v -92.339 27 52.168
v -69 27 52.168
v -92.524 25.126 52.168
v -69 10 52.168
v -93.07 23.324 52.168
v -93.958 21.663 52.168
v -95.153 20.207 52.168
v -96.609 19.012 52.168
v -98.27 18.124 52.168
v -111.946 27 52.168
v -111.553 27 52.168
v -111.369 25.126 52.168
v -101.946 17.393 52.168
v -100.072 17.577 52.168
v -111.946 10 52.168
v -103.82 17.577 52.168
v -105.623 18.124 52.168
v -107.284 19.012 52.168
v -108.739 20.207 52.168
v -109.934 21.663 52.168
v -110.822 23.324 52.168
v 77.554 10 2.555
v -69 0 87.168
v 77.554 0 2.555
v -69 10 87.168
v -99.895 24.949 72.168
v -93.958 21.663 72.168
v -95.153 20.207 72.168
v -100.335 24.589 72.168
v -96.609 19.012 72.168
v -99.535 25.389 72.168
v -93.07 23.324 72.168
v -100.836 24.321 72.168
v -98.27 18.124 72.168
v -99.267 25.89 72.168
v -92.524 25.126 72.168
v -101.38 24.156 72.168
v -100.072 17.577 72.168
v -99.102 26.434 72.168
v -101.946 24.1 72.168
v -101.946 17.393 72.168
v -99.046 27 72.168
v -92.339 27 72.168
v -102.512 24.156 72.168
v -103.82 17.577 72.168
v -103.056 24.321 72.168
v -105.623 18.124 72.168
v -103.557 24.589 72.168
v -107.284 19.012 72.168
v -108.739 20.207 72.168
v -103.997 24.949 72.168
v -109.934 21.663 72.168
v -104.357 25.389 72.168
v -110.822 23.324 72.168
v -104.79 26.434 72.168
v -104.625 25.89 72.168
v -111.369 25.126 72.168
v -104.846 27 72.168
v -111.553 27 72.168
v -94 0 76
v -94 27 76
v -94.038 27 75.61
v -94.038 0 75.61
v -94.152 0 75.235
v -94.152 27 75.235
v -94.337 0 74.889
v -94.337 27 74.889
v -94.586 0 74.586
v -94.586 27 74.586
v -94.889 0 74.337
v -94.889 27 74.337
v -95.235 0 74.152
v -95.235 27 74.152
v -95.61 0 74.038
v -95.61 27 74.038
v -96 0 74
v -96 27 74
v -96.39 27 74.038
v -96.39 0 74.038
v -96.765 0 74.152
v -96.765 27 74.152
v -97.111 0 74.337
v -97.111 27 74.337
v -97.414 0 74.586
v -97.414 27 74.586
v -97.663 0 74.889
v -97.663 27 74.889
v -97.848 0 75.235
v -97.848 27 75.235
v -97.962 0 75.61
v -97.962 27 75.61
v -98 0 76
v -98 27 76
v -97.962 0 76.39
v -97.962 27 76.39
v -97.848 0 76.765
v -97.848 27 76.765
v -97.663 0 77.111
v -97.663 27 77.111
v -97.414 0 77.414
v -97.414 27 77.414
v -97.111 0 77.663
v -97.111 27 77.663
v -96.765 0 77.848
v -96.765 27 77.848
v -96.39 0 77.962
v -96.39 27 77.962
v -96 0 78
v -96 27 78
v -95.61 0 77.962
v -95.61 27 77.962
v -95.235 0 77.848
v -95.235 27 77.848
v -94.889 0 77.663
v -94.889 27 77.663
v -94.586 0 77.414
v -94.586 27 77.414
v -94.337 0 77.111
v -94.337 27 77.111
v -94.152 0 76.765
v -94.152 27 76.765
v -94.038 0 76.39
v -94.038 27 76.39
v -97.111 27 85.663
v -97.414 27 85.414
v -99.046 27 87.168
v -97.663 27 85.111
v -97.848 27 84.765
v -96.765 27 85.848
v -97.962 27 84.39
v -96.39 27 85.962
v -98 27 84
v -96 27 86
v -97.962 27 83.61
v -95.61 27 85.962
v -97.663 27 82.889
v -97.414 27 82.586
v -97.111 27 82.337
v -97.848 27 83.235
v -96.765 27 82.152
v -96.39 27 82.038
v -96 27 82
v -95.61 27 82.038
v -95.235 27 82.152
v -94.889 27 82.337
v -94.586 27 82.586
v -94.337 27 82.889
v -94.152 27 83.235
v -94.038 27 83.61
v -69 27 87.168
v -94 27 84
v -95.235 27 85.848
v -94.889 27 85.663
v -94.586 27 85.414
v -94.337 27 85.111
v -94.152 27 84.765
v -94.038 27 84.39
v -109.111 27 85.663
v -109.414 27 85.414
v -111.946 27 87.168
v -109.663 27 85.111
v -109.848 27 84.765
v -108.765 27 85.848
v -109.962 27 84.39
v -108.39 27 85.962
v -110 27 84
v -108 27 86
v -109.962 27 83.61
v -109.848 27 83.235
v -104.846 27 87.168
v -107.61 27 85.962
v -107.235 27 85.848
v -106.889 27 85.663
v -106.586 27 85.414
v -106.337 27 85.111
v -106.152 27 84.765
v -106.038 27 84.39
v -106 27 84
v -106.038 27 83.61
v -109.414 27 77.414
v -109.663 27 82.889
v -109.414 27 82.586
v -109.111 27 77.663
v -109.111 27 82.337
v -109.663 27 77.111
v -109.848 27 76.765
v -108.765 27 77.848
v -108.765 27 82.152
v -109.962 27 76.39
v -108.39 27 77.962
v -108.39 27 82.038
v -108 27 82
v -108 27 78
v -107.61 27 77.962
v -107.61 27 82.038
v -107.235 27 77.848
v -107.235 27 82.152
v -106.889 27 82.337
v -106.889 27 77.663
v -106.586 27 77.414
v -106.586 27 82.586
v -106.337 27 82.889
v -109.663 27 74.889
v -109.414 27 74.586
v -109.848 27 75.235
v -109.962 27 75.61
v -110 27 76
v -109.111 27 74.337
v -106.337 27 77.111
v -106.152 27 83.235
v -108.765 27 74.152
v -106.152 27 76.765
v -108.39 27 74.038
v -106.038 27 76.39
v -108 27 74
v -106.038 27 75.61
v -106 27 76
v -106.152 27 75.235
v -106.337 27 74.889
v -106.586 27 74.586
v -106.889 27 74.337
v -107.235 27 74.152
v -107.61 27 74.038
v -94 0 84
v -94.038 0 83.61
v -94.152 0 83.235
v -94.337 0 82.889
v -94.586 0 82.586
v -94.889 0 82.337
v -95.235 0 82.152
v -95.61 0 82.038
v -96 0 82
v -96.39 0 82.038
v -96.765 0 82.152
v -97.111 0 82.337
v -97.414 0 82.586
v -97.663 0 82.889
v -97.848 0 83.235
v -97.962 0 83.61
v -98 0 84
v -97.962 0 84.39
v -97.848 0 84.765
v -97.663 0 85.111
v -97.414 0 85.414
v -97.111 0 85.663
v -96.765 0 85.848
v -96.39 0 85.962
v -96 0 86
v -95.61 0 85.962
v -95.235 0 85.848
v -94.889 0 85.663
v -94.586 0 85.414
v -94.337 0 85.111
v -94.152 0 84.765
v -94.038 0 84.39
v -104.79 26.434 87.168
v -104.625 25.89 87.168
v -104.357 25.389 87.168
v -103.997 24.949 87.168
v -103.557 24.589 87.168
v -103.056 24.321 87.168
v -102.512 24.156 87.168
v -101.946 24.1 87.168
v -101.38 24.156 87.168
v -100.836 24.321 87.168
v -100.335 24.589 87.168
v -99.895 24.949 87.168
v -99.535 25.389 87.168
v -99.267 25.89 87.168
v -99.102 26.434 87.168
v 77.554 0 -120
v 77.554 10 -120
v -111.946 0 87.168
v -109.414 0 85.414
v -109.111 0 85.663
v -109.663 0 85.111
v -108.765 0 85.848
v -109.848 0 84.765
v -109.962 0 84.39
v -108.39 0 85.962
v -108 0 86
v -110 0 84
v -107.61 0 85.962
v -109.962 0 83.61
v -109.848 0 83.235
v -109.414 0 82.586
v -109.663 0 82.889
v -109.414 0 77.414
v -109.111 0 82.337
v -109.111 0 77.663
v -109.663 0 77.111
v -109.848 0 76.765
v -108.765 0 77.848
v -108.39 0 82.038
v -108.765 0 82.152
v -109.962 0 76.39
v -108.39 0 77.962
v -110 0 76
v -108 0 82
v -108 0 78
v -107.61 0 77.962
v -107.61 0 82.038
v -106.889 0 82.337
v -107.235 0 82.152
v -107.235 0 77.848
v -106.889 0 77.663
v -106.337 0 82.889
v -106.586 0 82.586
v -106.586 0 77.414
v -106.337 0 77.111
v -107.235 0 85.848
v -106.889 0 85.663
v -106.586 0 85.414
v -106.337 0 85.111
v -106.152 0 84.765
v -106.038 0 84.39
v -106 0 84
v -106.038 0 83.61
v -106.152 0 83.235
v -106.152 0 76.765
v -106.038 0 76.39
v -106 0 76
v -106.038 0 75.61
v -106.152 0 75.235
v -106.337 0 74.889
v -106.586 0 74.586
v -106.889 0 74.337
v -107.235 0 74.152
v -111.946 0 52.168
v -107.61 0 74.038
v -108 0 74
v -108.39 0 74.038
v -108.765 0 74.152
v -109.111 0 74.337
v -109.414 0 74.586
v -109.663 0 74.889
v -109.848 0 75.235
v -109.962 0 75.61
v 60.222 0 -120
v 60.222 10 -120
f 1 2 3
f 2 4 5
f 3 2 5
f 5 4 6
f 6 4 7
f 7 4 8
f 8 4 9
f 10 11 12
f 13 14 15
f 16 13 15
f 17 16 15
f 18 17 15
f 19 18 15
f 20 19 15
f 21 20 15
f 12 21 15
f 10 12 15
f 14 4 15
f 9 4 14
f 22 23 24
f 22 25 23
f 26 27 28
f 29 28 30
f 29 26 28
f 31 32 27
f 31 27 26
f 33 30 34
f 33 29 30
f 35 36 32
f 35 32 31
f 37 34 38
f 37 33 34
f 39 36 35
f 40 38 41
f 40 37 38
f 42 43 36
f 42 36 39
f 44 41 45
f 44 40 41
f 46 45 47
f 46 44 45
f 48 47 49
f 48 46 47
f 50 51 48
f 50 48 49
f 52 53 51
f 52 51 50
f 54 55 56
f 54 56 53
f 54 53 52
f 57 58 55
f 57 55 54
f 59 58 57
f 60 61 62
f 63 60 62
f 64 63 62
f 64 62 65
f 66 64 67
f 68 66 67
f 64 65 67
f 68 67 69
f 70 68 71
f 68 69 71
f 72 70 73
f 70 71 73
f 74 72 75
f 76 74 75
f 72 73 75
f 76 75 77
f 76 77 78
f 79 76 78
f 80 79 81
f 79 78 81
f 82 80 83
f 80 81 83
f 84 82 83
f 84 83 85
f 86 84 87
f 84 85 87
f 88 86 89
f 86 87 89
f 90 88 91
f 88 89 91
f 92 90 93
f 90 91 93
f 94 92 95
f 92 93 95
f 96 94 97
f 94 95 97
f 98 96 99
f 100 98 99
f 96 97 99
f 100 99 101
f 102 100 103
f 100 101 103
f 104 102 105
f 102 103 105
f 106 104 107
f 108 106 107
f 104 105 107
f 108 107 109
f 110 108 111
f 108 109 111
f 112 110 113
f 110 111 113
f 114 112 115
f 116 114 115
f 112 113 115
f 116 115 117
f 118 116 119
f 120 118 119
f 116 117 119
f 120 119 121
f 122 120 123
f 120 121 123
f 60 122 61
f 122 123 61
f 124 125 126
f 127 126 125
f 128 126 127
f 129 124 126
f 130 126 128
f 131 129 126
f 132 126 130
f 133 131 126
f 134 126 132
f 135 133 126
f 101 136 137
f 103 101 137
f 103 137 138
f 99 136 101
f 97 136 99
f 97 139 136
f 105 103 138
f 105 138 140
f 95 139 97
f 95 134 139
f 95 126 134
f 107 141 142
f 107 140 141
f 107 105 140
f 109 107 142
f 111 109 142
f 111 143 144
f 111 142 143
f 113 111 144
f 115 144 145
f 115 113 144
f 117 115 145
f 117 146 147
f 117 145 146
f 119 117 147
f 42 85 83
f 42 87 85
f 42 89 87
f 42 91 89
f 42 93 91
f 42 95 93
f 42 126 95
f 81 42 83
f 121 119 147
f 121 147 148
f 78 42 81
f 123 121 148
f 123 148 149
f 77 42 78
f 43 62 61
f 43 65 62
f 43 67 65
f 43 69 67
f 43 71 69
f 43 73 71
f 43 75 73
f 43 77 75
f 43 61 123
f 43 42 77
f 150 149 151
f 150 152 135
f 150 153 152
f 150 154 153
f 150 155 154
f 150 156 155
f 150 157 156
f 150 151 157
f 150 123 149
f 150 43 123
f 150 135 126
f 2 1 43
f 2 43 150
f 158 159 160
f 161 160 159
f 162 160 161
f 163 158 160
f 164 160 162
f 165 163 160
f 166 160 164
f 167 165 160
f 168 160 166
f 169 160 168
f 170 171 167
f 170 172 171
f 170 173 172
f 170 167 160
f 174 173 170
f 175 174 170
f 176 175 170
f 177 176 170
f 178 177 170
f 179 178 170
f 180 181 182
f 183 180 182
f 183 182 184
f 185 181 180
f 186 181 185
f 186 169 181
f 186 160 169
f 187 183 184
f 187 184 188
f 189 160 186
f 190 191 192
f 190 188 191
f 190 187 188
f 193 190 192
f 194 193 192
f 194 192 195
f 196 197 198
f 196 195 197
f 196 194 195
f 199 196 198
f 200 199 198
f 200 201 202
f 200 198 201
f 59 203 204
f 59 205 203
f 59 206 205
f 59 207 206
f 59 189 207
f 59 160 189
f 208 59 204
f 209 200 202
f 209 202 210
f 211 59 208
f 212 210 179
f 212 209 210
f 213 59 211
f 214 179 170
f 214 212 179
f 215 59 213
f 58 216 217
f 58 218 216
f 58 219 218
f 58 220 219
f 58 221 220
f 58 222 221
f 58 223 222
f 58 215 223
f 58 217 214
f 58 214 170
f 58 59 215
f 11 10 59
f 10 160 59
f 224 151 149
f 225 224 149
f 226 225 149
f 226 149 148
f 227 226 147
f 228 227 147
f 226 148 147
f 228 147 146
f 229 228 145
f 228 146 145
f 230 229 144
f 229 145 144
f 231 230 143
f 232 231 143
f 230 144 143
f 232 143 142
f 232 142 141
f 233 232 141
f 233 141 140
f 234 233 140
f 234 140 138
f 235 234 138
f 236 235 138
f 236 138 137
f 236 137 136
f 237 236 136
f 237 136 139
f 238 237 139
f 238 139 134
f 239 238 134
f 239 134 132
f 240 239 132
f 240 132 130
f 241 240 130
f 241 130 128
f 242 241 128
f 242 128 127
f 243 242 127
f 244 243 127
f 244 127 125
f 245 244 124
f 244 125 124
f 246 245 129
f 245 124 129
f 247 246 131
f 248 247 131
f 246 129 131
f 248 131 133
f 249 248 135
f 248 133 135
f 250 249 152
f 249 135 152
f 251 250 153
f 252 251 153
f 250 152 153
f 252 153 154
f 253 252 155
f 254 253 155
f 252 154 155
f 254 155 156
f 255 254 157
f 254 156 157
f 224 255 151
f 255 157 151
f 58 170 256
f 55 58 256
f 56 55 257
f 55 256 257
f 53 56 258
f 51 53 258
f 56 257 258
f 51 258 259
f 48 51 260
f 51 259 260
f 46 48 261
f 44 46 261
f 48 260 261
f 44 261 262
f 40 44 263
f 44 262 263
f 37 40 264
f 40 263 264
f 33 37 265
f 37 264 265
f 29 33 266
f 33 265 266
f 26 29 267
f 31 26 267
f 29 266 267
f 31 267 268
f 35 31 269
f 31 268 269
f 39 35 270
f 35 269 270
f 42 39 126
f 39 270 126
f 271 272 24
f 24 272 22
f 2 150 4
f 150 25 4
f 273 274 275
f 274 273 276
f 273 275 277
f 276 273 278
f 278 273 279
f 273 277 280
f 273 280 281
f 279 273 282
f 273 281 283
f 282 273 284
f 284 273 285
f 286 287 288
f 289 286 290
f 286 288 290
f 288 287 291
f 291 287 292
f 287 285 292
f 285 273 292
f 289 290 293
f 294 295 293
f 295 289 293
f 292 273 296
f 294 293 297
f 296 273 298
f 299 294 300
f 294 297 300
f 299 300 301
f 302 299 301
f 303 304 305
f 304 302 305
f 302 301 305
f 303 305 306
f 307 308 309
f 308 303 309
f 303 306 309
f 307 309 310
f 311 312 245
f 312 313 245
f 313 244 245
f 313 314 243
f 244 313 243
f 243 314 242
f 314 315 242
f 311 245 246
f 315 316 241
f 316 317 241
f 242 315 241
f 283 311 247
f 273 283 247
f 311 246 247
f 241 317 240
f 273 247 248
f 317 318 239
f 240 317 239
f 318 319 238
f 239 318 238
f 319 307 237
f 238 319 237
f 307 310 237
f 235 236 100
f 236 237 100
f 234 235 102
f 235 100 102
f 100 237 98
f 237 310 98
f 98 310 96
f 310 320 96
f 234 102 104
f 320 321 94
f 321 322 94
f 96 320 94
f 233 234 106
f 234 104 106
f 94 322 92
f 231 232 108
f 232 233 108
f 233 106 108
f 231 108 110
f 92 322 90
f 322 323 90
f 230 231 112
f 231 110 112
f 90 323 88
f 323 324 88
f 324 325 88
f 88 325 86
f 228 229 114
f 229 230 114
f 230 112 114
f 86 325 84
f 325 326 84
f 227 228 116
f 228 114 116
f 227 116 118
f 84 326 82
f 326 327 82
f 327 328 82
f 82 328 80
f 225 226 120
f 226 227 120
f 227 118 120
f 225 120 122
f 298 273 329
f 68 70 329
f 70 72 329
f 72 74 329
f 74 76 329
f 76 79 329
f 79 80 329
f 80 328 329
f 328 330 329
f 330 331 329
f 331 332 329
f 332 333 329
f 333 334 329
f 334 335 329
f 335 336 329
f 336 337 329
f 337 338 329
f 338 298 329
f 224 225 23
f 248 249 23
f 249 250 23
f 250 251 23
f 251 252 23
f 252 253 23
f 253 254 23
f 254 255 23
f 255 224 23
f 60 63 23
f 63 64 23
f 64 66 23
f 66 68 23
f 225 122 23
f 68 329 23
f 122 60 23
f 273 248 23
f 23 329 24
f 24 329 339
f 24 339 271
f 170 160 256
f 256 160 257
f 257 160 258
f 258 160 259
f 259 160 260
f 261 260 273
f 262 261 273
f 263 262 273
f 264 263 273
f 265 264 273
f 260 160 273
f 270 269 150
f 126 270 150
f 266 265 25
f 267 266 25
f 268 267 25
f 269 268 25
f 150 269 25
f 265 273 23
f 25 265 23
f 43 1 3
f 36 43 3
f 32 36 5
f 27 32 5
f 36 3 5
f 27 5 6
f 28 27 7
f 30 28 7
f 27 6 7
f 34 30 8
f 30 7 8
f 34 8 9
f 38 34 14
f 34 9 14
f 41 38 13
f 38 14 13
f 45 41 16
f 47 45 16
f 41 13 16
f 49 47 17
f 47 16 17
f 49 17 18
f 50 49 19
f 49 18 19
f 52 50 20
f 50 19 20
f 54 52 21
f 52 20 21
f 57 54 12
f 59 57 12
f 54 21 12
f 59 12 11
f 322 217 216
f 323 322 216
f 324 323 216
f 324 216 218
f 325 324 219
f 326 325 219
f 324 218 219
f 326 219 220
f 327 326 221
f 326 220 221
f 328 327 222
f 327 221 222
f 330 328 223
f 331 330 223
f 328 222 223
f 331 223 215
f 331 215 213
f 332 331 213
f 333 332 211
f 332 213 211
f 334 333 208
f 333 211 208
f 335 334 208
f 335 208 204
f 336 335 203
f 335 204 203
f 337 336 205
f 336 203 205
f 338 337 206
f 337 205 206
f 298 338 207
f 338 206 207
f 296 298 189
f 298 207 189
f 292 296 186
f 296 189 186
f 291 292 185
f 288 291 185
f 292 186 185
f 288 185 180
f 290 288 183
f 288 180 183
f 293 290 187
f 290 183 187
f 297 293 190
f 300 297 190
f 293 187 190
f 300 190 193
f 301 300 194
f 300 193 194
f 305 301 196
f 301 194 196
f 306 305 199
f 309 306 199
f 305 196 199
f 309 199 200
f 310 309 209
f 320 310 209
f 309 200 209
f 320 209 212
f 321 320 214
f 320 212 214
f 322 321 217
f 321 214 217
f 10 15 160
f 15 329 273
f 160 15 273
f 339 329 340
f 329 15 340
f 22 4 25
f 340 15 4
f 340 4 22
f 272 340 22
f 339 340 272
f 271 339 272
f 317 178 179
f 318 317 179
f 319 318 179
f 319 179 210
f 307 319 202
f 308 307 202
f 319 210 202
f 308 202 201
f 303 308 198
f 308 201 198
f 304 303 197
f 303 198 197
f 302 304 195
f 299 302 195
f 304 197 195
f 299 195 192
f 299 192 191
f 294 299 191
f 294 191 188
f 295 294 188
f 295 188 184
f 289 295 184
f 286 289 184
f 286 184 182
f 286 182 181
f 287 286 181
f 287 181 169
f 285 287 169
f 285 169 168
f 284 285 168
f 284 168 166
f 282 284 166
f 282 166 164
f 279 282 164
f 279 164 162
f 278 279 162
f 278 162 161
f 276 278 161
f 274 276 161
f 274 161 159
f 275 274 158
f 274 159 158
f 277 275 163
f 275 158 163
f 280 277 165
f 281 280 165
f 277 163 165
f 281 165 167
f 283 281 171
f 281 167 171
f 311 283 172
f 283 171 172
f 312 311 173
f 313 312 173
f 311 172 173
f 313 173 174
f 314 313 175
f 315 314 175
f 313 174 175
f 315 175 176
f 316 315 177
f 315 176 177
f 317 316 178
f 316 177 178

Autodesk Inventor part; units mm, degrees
ref_plane "YZ Plane" through (0, 0, 0) normal (1, 0, 0) x (0, 1, 0)
ref_plane "XZ Plane" through (0, 0, 0) normal (0, 1, 0) x (-1, 0, 0)
ref_plane "XY Plane" through (0, 0, 0) normal (0, 0, 1) x (1, 0, 0)
sketch "Sketch1" plane through (0, 0, 0) normal (0, 1, 0) x (-1, 0, 0)
  line L0 (111.9461, 87.1683) -> (-118.0539, 87.1683)
  line L1 (-118.0539, 87.1683) -> (-118.0539, -87.8317)
  line L2 (-118.0539, -87.8317) -> (111.9461, -87.8317)
  line L3 (111.9461, -87.8317) -> (111.9461, 87.1683)
  line L4 (111.9461, 52.1683) -> (-28.0539, -87.8317)
  point P0 (0, 0)
  dimension "d0" = 175
  dimension "d1" = 230
  dimension "d2" = 45
  dimension "d3" = 35
extrude "Extrusion1" add sketch "Sketch1" along normal blind 10 contours L3 L4 L2 L1 L0
sketch "Sketch2" plane through (0, 10, 0) normal (0, 1, 0) x (1, 0, 0)
  line L0 (-111.9461, -52.1683) -> (-111.9461, -87.1683) projected
  line L1 (-111.9461, -87.1683) -> (-69, -87.1683)
  line L2 (-69, -87.1683) -> (-69, -52.1683)
  line L3 (-69, -52.1683) -> (-111.9461, -52.1683)
  line L4 (-111.9461, -52.1683) -> (-111.9461, -87.1683)
  point P0 (0, 0)
extrude "Extrusion2" add sketch "Sketch2" along normal blind 17
sketch "Sketch3" plane through (-111.9461, 0, 87.1683) normal (0, 0, 1) x (1, 0, 0)
  line L0 (0, 27) -> (42.9461, 27) projected
  circle A0 centre (10, 27) radius 2.9
  point P0 (111.9461, 0)
  point P1 (12.9, 27)
  point P2 (7.1, 27)
  dimension "d12" = 5.8
extrude "Extrusion3" cut sketch "Sketch3" against normal blind 40 contours L0 A0 picked at (10.9386, 26.7687)
sketch "Sketch4" plane through (-69, 10, 52.1683) normal (0, 0, -1) x (-1, 0, 0)
  arc A0 (30.0461, 17) -> (35.8461, 17) centre (32.9461, 17) ccw projected
  circle A1 centre (32.9461, 17) radius 9.6071
  point P0 (-69, -10)
extrude "Extrusion4" cut sketch "Sketch4" against normal blind 20
sketch "Sketch5" plane through (0, 27, 0) normal (0, 1, 0) x (1, 0, 0)
  circle A0 centre (-108, -84) radius 2
  circle A1 centre (-108, -76) radius 2
  circle A2 centre (-96, -76) radius 2
  circle A3 centre (-96, -84) radius 2
  point P0 (0, 0)
extrude "Extrusion5" cut sketch "Sketch5" against normal blind 40
sketch "Sketch6" plane through (0, 10, 0) normal (0, 1, 0) x (1, 0, 0)
  line L0 (-111.9461, -87.1683) -> (118.0539, -87.1683) projected
  line L1 (118.0539, -87.1683) -> (118.0539, 87.8317) projected
  line L2 (-99.0461, -87.1683) -> (-69, -87.1683) projected
  line L3 (-69, -87.1683) -> (118.0539, 20.8273)
  point P0 (0, 0)
  dimension "d18" = 30
extrude "Extrusion6" cut sketch "Sketch6" against normal blind 40
sketch "Sketch7" plane through (0, 10, 0) normal (0, 1, 0) x (1, 0, 0)
  line L0 (28.0539, 87.8317) -> (-111.9461, -52.1683) projected
  line L1 (28.0539, 87.8317) -> (93.621, 153.3988)
  line L2 (93.621, 153.3988) -> (118.0539, 153.3988)
  line L3 (118.0539, 20.8273) -> (118.0539, 87.8317) projected
  line L4 (118.0539, 153.3988) -> (118.0539, 87.8317)
  line L5 (28.0539, 87.8317) -> (118.0539, 87.8317)
  point P0 (0, 0)
extrude "Extrusion7" add sketch "Sketch7" against normal blind 10
sketch "Sketch8" plane through (0, 10, 0) normal (0, 1, 0) x (1, 0, 0)
  line L0 (118.0539, 20.8273) -> (118.0539, 153.3988) projected
  line L1 (118.0539, 153.3988) -> (77.5539, 153.3988)
  line L2 (77.5539, 153.3988) -> (77.5539, -53)
  line L3 (77.5539, -53) -> (118.0539, -53)
  line L4 (118.0539, -53) -> (118.0539, 153.3988)
  line L5 (77.5539, 153.3988) -> (12, 153.3988)
  line L6 (12, 153.3988) -> (12, 120)
  line L7 (12, 120) -> (77.5539, 120)
  line L8 (77.5539, 120) -> (77.5539, 153.3988)
  point P0 (0, 0)
  dimension "d23" = 40.5
extrude "Extrusion8" cut sketch "Sketch8" against normal blind 10
properties part number "Z_babka"
